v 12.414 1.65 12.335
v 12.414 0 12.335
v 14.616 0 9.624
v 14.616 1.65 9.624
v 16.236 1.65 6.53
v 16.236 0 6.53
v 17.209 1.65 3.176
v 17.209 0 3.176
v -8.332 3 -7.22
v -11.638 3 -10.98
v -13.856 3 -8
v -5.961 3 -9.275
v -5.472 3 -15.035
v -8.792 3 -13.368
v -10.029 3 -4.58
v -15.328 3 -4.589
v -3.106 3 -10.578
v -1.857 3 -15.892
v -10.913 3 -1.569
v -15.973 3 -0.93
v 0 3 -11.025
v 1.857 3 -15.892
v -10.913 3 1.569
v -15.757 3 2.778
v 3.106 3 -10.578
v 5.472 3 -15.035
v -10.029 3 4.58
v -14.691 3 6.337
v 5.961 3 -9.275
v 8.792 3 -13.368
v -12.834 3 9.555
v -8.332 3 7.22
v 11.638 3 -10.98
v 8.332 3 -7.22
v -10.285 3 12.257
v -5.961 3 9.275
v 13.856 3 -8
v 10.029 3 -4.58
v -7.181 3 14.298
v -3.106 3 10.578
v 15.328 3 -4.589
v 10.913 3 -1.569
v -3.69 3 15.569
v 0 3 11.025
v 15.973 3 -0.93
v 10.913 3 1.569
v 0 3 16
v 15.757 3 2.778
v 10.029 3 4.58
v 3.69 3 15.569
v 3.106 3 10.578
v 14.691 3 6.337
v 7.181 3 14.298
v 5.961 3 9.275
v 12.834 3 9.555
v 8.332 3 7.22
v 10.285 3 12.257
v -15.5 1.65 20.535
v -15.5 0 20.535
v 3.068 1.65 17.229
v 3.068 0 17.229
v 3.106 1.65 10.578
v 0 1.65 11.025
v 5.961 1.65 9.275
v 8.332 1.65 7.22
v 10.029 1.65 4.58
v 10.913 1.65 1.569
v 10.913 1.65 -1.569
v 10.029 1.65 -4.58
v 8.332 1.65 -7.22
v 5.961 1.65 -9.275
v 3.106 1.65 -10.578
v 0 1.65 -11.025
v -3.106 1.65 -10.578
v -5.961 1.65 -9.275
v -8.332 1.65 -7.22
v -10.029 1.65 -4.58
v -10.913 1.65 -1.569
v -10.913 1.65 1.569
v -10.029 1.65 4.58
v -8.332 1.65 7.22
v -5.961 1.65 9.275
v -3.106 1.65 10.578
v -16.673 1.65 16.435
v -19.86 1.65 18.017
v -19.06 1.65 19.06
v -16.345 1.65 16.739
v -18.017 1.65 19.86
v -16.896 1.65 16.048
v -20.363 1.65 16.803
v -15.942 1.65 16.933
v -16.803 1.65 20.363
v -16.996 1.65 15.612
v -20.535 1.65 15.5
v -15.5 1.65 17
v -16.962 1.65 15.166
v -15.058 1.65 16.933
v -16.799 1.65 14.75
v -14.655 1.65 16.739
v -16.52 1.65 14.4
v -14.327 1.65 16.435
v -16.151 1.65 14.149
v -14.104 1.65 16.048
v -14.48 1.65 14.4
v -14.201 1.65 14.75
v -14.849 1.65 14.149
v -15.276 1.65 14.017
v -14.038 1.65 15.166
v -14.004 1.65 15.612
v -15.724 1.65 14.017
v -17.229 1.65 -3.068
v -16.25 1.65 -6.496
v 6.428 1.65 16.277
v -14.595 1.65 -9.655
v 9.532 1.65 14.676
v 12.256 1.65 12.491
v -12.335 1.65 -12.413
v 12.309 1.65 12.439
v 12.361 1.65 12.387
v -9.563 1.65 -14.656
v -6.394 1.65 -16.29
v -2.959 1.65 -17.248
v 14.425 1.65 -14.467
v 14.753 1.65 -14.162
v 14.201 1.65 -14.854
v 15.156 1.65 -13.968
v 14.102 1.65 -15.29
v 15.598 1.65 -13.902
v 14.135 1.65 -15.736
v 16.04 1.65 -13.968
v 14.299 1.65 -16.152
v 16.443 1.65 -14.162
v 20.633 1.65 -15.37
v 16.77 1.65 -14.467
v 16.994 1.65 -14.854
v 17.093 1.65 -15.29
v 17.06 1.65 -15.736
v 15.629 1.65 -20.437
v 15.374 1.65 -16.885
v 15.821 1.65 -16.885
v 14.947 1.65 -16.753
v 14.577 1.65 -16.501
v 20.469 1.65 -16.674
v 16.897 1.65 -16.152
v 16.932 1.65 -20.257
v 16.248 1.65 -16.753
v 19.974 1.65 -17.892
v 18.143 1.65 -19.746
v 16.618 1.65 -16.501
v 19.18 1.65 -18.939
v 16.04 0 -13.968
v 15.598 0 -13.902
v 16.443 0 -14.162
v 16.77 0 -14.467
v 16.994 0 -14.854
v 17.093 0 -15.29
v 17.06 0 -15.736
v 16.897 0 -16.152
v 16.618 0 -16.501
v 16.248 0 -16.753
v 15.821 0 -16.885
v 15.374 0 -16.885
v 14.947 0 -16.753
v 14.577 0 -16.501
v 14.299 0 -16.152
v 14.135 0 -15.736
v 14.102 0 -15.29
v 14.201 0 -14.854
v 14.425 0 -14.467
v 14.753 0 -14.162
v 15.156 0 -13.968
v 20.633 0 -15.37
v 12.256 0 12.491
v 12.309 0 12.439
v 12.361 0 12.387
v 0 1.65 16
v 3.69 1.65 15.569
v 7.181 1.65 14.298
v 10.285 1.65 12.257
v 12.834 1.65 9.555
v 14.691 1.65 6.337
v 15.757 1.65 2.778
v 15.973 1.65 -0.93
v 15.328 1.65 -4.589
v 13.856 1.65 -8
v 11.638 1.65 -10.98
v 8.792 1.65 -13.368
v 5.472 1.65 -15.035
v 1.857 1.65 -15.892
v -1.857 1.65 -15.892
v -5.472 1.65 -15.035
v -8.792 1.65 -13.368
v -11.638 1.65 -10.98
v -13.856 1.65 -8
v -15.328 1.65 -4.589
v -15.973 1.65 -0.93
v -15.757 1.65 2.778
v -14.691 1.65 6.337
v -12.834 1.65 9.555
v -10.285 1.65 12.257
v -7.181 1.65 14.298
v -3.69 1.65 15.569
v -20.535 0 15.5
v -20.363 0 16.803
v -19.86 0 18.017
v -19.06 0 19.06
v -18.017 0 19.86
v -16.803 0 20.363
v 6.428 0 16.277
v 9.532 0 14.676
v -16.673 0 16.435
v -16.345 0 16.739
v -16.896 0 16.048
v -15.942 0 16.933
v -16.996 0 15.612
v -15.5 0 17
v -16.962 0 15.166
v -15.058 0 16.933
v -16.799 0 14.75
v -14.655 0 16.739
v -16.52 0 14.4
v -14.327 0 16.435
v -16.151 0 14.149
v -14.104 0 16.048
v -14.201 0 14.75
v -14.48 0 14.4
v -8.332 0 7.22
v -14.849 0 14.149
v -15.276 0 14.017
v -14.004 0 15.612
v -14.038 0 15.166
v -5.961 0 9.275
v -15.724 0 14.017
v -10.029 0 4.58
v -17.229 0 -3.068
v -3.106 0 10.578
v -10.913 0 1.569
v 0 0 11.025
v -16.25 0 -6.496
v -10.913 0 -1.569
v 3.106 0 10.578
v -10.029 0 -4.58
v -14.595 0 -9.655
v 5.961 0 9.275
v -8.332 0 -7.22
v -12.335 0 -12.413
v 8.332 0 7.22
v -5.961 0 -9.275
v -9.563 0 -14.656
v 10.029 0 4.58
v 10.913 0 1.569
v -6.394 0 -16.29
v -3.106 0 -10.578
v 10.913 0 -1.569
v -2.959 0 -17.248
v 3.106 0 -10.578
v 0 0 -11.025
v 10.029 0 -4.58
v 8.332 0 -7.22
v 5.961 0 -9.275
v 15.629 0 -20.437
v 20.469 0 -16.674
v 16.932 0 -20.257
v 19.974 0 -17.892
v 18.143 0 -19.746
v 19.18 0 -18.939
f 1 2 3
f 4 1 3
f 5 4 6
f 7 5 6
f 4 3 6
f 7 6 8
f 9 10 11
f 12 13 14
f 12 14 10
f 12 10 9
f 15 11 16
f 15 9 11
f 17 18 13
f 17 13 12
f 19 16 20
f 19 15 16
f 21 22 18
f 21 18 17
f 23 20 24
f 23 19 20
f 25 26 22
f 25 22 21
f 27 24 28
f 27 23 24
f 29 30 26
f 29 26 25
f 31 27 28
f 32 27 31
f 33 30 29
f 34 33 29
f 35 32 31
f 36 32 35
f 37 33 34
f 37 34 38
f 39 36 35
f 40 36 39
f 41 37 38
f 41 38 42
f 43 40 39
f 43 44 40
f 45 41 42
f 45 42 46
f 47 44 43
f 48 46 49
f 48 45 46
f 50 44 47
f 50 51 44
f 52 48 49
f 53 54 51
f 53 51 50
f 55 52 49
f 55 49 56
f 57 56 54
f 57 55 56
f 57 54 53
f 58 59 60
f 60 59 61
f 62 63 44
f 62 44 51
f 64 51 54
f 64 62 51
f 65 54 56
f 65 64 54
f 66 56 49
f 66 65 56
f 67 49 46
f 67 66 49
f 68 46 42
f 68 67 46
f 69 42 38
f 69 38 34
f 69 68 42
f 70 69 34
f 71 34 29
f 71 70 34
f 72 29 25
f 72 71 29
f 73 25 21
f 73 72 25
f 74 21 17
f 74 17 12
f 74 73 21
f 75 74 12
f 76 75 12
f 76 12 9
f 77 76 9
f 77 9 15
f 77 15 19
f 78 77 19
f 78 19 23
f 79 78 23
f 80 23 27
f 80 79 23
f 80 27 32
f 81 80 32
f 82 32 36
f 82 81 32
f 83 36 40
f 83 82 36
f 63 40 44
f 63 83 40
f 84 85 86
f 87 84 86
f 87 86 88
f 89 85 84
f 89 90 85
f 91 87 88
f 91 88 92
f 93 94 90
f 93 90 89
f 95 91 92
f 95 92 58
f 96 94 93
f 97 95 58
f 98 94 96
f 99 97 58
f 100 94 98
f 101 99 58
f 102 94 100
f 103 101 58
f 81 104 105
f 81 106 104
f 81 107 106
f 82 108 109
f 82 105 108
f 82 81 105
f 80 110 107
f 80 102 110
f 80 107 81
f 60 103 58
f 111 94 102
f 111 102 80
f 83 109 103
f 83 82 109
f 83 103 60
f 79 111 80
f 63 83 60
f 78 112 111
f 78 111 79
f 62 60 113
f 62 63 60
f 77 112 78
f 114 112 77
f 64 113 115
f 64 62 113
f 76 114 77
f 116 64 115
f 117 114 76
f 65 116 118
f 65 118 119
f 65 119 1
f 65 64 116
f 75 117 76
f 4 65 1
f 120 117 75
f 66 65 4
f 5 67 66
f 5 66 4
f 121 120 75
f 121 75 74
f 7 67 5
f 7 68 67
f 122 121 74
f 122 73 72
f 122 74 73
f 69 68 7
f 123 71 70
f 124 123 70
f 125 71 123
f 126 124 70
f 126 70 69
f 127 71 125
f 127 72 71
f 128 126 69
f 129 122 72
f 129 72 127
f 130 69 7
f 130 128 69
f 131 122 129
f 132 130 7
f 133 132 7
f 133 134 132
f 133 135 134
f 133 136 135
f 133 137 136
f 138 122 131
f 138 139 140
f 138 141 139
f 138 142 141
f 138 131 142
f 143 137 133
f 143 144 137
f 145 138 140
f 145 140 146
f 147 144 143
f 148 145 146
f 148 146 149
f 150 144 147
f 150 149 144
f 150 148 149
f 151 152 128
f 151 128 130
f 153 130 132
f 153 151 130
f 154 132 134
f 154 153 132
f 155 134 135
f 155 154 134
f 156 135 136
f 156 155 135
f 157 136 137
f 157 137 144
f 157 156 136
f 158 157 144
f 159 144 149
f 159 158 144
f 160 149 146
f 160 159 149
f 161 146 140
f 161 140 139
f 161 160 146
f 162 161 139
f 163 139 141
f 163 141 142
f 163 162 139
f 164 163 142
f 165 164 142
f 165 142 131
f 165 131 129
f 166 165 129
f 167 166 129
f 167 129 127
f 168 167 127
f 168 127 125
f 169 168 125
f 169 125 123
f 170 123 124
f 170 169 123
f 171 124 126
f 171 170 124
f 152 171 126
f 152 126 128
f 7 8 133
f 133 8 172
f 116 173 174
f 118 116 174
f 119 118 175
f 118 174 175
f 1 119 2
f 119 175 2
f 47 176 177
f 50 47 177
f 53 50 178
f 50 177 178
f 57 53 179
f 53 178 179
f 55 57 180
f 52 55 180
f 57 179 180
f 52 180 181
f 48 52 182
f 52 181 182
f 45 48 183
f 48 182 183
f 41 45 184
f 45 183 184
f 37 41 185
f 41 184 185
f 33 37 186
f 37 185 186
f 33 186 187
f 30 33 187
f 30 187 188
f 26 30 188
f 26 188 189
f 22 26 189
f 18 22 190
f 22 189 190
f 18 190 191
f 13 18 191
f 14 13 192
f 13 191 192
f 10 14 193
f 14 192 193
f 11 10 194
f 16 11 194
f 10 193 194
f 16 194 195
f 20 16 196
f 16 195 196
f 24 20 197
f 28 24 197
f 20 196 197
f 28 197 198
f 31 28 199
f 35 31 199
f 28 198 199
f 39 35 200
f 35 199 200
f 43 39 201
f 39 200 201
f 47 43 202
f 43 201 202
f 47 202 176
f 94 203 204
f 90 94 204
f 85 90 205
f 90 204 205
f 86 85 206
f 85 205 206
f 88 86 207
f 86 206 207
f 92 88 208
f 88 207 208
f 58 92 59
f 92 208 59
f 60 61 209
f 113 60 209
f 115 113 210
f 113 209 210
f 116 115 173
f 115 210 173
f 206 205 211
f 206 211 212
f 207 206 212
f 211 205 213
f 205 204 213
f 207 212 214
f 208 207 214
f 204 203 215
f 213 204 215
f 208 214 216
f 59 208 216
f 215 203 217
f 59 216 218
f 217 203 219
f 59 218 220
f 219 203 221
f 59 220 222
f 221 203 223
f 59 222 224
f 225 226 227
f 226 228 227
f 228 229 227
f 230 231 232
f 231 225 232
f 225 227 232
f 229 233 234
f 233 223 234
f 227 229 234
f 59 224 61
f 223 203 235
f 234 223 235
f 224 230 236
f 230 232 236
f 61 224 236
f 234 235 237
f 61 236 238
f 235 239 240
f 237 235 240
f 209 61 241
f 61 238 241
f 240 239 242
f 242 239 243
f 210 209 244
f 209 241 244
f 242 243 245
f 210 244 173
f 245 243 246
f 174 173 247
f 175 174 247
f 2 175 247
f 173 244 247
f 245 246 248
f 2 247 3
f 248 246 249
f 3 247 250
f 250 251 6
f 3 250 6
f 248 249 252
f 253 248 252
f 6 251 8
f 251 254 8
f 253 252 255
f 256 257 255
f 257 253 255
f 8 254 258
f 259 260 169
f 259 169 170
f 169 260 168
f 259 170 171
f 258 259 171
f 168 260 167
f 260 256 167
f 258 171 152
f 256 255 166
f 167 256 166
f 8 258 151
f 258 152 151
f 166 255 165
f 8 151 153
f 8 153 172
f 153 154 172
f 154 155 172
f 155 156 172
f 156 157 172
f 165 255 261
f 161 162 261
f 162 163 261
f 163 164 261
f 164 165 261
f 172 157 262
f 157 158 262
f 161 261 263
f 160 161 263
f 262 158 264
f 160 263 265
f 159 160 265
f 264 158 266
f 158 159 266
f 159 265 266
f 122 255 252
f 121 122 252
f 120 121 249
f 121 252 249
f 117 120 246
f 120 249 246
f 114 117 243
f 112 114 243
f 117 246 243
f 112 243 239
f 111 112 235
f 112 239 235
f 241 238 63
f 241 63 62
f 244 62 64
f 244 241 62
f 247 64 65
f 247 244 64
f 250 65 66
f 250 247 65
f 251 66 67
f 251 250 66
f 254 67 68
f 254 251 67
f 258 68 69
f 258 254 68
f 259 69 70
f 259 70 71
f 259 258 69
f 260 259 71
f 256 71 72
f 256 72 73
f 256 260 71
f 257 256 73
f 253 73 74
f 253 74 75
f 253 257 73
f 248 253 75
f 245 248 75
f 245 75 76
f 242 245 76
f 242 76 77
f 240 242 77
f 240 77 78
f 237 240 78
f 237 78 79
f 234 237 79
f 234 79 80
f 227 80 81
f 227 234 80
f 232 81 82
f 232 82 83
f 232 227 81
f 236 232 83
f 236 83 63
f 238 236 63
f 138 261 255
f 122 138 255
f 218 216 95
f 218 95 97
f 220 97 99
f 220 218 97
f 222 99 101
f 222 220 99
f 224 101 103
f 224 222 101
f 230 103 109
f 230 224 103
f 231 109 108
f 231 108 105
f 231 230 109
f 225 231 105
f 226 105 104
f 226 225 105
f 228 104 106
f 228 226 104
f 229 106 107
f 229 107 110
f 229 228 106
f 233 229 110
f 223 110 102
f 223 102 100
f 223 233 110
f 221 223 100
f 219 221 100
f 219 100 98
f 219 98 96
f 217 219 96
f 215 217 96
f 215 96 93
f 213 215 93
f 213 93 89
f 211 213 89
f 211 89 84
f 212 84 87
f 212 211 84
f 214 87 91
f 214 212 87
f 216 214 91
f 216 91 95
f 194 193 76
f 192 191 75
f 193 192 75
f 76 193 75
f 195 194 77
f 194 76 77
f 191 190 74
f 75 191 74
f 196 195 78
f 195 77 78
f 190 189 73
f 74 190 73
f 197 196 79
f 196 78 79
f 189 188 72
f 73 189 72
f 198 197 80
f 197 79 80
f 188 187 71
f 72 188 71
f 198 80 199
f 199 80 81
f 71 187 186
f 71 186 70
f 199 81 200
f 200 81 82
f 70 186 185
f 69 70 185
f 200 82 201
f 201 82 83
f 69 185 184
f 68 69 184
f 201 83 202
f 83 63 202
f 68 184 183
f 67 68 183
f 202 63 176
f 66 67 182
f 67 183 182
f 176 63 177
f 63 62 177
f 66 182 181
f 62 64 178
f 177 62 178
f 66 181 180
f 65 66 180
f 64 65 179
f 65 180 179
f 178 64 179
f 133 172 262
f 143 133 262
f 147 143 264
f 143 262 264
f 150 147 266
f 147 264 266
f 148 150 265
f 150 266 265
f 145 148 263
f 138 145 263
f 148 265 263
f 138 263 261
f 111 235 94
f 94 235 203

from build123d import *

# Parameters (mm, degrees)
SKETCH1_R           = 1500
SKETCH1_R_2         = 11025
BOSS_EXTRUDE1_DEPTH = 1650
SKETCH2_R           = 16000
SKETCH2_R_2         = 11025
BOSS_EXTRUDE2_DEPTH = 1350
SCALE2_SCALE        = 0.001


with BuildPart() as part:
    # Sketch1 → Boss-Extrude1 (new body)
    with BuildSketch(Plane(origin=(0, 0, 0), x_dir=(1, 0, 0), z_dir=(0, 1, 0))):
        with BuildLine():
            Line((17209.305722817, -3176.444009941), (20632.540093335, 15369.919992931))
            ThreePointArc((20632.540093335, 15369.919992931), (19180.351834931, 18939.449717944), (15629.46099565, 20436.636227071))
            Line((15629.46099565, 20436.636227071), (-2958.686933947, 17248.077331592))
            ThreePointArc((-2958.686933947, 17248.077331592), (-12335.206917505, 12413.406877728), (-17229.035558487, 3067.626726653))
            Line((-17229.035558487, 3067.626726653), (-20534.998205313, -15500))
            ThreePointArc((-20534.998205313, -15500), (-19060.281374239, -19060.281374239), (-15500, -20534.998205312))
            Line((-15500, -20534.998205312), (3067.626726653, -17229.035558487))
            ThreePointArc((3067.626726653, -17229.035558487), (8019.775569124, -15554.201999156), (12256.263323125, -12491.357386765))
            ThreePointArc((12256.263323125, -12491.357386765), (12335.206917505, -12413.406877728), (12413.654752449, -12334.957466351))
            ThreePointArc((12413.654752449, -12334.957466351), (15503.210603375, -8117.909890919), (17209.305722817, -3176.444009941))
        make_face()
        with Locations(Location((-15500, -15500, 0), (0, 0, 270))):
            Circle(SKETCH1_R, mode=Mode.SUBTRACT)
        with Locations(Location((0, 0, 0), (0, 0, 270))):
            Circle(SKETCH1_R_2, mode=Mode.SUBTRACT)
        with Locations(Location((15597.642427422, 15401.738561158, 0), (0, 0, 270))):
            Circle(SKETCH1_R, mode=Mode.SUBTRACT)
    extrude(amount=BOSS_EXTRUDE1_DEPTH)


with BuildPart() as body_2:
    # Sketch2 → Boss-Extrude2 (new body)
    with BuildSketch(Plane(origin=(0, 1650, 0), x_dir=(1, 0, 0), z_dir=(0, 1, 0))):
        with Locations(Location((0, 0, 0), (0, 0, 270))):
            Circle(SKETCH2_R)
        with Locations(Location((0, 0, 0), (0, 0, 270))):
            Circle(SKETCH2_R_2, mode=Mode.SUBTRACT)
    extrude(amount=BOSS_EXTRUDE2_DEPTH)


with BuildPart() as body_2_1:
    # Scale2: scaled about (0, 0, 0)
    add(body_2.part.scale(SCALE2_SCALE))


with BuildPart() as part_1:
    # Scale2: scaled about (0, 0, 0)
    add(part.part.scale(SCALE2_SCALE))


solid = Compound([body_2_1.part, part_1.part])
